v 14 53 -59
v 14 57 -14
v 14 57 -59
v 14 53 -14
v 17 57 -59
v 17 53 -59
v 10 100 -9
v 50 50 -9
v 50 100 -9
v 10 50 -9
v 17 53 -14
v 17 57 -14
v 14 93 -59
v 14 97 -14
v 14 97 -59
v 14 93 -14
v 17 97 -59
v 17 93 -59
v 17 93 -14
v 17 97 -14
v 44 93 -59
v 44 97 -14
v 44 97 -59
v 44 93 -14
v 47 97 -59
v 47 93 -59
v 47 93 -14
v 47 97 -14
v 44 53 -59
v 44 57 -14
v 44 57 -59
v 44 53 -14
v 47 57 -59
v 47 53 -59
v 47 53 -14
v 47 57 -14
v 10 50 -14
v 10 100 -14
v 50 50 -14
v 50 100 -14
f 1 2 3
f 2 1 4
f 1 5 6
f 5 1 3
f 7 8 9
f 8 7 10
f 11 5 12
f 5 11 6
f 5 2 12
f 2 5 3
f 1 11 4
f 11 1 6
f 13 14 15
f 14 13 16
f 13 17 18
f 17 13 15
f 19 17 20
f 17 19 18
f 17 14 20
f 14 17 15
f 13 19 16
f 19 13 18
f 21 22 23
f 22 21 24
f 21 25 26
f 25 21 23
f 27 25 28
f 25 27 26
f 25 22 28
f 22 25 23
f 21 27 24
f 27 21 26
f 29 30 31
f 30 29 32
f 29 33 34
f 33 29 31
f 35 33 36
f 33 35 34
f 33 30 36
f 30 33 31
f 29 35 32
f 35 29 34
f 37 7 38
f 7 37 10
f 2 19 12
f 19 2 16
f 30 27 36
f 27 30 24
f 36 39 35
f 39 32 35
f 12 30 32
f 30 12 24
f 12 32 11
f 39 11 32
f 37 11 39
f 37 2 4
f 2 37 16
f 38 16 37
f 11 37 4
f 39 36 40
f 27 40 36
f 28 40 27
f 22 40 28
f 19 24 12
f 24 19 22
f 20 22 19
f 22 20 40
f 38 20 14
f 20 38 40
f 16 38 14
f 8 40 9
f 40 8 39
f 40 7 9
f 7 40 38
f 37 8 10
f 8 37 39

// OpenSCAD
function func1(x,y,z)=([3,4,50]);   //function definition
echo(g);
g=func1();              // assigning function
function func2(x,y,z)=([0,180,0]);   //function definition
function func3()=([-50,50,9]);     //function definition
rotate(func2())             //calling a function
translate(func3())         //calling a function
union()
{
    translate([33,3,0])
    cube(g);           //calling a function
translate([33,43,0])
 cube(g);
translate([3,43,0])
 cube(g);
translate([3,3,0])
 cube(g);
    x=40;               // variable declaration
    y=50;
    z=5;
 cube([x,y,z]);
}
